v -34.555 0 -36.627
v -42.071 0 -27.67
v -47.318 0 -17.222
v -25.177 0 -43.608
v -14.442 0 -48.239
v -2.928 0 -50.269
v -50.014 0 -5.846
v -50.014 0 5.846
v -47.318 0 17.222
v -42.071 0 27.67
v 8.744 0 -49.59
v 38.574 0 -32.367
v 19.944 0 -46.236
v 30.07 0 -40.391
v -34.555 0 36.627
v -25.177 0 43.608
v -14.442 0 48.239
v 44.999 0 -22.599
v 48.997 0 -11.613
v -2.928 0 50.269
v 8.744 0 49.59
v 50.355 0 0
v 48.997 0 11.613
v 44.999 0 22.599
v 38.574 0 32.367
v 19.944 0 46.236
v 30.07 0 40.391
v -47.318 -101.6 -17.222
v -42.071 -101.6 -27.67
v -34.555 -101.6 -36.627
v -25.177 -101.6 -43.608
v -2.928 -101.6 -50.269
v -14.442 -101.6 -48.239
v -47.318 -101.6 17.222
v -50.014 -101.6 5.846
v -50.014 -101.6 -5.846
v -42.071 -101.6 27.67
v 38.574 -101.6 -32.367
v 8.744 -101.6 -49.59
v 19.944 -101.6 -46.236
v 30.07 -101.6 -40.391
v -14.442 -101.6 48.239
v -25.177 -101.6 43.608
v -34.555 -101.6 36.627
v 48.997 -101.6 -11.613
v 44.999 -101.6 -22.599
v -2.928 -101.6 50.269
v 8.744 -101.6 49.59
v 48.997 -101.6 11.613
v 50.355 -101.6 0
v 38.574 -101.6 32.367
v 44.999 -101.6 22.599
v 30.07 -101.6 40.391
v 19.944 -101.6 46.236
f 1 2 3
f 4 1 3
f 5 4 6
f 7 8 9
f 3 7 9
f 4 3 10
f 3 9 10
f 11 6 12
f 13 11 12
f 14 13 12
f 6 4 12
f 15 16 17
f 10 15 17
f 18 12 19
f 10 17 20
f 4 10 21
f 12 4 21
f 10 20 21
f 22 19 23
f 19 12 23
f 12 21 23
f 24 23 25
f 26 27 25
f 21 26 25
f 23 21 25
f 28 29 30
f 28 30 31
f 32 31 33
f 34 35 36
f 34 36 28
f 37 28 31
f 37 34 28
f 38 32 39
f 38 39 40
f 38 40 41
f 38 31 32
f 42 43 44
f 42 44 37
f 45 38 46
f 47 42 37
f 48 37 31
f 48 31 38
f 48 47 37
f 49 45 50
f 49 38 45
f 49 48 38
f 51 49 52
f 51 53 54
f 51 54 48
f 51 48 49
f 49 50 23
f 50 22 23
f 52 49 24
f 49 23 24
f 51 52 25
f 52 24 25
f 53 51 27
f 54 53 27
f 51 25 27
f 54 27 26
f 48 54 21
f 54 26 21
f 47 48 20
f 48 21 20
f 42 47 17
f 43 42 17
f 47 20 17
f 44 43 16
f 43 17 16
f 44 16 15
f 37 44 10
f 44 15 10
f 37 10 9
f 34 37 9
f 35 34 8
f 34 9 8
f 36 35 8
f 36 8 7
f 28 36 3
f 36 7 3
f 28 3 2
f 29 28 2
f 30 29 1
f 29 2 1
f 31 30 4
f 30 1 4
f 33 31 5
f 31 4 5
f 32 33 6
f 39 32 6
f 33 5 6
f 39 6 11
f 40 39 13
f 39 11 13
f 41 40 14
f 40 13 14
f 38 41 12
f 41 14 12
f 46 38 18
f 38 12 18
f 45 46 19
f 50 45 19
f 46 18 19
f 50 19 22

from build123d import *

# Parameters (mm, degrees)
F0_R      = 50.354649
F1_DEPTH  = 50.8
F3_DEPTH  = 25.4
F4_DEPTH  = 25.4
F1_FACE_R = 50.354649
F5_DEPTH  = 50.8


with BuildPart() as f1:
    # F0 (on Front) → F1 (new body)
    with BuildSketch(Plane.XZ):
        Circle(F0_R)
    extrude(amount=F1_DEPTH)

    # F2 (on Front) → F3 (join)
    with BuildSketch(Plane.XZ):
        Polygon((0, 0), (-25.05855, 43.402681), (-50.1171, 0), align=None)
        Polygon((25.05855, 43.402681), (-25.05855, 43.402681), (0, 0), align=None)
        Polygon((50.1171, 0), (25.05855, 43.402681), (0, 0), align=None)
        Polygon((0, 0), (-50.1171, 0), (-25.05855, -43.402681), align=None)
        Polygon((50.1171, 0), (0, 0), (25.05855, -43.402681), align=None)
        Polygon((25.05855, -43.402681), (0, 0), (-25.05855, -43.402681), align=None)
    extrude(amount=F3_DEPTH)

    # F2 (on Front) → F4 (join)
    with BuildSketch(Plane.XZ):
        Polygon((0, 0), (-25.05855, 43.402681), (-50.1171, 0), align=None)
        Polygon((25.05855, 43.402681), (-25.05855, 43.402681), (0, 0), align=None)
        Polygon((50.1171, 0), (25.05855, 43.402681), (0, 0), align=None)
        Polygon((0, 0), (-50.1171, 0), (-25.05855, -43.402681), align=None)
        Polygon((50.1171, 0), (0, 0), (25.05855, -43.402681), align=None)
        Polygon((25.05855, -43.402681), (0, 0), (-25.05855, -43.402681), align=None)
    extrude(amount=F4_DEPTH)

    # F1_face (on face) → F5 (join)
    with BuildSketch(Plane.XZ.offset(50.8)):
        Circle(F1_FACE_R)
    extrude(amount=F5_DEPTH)


solid = f1.part
